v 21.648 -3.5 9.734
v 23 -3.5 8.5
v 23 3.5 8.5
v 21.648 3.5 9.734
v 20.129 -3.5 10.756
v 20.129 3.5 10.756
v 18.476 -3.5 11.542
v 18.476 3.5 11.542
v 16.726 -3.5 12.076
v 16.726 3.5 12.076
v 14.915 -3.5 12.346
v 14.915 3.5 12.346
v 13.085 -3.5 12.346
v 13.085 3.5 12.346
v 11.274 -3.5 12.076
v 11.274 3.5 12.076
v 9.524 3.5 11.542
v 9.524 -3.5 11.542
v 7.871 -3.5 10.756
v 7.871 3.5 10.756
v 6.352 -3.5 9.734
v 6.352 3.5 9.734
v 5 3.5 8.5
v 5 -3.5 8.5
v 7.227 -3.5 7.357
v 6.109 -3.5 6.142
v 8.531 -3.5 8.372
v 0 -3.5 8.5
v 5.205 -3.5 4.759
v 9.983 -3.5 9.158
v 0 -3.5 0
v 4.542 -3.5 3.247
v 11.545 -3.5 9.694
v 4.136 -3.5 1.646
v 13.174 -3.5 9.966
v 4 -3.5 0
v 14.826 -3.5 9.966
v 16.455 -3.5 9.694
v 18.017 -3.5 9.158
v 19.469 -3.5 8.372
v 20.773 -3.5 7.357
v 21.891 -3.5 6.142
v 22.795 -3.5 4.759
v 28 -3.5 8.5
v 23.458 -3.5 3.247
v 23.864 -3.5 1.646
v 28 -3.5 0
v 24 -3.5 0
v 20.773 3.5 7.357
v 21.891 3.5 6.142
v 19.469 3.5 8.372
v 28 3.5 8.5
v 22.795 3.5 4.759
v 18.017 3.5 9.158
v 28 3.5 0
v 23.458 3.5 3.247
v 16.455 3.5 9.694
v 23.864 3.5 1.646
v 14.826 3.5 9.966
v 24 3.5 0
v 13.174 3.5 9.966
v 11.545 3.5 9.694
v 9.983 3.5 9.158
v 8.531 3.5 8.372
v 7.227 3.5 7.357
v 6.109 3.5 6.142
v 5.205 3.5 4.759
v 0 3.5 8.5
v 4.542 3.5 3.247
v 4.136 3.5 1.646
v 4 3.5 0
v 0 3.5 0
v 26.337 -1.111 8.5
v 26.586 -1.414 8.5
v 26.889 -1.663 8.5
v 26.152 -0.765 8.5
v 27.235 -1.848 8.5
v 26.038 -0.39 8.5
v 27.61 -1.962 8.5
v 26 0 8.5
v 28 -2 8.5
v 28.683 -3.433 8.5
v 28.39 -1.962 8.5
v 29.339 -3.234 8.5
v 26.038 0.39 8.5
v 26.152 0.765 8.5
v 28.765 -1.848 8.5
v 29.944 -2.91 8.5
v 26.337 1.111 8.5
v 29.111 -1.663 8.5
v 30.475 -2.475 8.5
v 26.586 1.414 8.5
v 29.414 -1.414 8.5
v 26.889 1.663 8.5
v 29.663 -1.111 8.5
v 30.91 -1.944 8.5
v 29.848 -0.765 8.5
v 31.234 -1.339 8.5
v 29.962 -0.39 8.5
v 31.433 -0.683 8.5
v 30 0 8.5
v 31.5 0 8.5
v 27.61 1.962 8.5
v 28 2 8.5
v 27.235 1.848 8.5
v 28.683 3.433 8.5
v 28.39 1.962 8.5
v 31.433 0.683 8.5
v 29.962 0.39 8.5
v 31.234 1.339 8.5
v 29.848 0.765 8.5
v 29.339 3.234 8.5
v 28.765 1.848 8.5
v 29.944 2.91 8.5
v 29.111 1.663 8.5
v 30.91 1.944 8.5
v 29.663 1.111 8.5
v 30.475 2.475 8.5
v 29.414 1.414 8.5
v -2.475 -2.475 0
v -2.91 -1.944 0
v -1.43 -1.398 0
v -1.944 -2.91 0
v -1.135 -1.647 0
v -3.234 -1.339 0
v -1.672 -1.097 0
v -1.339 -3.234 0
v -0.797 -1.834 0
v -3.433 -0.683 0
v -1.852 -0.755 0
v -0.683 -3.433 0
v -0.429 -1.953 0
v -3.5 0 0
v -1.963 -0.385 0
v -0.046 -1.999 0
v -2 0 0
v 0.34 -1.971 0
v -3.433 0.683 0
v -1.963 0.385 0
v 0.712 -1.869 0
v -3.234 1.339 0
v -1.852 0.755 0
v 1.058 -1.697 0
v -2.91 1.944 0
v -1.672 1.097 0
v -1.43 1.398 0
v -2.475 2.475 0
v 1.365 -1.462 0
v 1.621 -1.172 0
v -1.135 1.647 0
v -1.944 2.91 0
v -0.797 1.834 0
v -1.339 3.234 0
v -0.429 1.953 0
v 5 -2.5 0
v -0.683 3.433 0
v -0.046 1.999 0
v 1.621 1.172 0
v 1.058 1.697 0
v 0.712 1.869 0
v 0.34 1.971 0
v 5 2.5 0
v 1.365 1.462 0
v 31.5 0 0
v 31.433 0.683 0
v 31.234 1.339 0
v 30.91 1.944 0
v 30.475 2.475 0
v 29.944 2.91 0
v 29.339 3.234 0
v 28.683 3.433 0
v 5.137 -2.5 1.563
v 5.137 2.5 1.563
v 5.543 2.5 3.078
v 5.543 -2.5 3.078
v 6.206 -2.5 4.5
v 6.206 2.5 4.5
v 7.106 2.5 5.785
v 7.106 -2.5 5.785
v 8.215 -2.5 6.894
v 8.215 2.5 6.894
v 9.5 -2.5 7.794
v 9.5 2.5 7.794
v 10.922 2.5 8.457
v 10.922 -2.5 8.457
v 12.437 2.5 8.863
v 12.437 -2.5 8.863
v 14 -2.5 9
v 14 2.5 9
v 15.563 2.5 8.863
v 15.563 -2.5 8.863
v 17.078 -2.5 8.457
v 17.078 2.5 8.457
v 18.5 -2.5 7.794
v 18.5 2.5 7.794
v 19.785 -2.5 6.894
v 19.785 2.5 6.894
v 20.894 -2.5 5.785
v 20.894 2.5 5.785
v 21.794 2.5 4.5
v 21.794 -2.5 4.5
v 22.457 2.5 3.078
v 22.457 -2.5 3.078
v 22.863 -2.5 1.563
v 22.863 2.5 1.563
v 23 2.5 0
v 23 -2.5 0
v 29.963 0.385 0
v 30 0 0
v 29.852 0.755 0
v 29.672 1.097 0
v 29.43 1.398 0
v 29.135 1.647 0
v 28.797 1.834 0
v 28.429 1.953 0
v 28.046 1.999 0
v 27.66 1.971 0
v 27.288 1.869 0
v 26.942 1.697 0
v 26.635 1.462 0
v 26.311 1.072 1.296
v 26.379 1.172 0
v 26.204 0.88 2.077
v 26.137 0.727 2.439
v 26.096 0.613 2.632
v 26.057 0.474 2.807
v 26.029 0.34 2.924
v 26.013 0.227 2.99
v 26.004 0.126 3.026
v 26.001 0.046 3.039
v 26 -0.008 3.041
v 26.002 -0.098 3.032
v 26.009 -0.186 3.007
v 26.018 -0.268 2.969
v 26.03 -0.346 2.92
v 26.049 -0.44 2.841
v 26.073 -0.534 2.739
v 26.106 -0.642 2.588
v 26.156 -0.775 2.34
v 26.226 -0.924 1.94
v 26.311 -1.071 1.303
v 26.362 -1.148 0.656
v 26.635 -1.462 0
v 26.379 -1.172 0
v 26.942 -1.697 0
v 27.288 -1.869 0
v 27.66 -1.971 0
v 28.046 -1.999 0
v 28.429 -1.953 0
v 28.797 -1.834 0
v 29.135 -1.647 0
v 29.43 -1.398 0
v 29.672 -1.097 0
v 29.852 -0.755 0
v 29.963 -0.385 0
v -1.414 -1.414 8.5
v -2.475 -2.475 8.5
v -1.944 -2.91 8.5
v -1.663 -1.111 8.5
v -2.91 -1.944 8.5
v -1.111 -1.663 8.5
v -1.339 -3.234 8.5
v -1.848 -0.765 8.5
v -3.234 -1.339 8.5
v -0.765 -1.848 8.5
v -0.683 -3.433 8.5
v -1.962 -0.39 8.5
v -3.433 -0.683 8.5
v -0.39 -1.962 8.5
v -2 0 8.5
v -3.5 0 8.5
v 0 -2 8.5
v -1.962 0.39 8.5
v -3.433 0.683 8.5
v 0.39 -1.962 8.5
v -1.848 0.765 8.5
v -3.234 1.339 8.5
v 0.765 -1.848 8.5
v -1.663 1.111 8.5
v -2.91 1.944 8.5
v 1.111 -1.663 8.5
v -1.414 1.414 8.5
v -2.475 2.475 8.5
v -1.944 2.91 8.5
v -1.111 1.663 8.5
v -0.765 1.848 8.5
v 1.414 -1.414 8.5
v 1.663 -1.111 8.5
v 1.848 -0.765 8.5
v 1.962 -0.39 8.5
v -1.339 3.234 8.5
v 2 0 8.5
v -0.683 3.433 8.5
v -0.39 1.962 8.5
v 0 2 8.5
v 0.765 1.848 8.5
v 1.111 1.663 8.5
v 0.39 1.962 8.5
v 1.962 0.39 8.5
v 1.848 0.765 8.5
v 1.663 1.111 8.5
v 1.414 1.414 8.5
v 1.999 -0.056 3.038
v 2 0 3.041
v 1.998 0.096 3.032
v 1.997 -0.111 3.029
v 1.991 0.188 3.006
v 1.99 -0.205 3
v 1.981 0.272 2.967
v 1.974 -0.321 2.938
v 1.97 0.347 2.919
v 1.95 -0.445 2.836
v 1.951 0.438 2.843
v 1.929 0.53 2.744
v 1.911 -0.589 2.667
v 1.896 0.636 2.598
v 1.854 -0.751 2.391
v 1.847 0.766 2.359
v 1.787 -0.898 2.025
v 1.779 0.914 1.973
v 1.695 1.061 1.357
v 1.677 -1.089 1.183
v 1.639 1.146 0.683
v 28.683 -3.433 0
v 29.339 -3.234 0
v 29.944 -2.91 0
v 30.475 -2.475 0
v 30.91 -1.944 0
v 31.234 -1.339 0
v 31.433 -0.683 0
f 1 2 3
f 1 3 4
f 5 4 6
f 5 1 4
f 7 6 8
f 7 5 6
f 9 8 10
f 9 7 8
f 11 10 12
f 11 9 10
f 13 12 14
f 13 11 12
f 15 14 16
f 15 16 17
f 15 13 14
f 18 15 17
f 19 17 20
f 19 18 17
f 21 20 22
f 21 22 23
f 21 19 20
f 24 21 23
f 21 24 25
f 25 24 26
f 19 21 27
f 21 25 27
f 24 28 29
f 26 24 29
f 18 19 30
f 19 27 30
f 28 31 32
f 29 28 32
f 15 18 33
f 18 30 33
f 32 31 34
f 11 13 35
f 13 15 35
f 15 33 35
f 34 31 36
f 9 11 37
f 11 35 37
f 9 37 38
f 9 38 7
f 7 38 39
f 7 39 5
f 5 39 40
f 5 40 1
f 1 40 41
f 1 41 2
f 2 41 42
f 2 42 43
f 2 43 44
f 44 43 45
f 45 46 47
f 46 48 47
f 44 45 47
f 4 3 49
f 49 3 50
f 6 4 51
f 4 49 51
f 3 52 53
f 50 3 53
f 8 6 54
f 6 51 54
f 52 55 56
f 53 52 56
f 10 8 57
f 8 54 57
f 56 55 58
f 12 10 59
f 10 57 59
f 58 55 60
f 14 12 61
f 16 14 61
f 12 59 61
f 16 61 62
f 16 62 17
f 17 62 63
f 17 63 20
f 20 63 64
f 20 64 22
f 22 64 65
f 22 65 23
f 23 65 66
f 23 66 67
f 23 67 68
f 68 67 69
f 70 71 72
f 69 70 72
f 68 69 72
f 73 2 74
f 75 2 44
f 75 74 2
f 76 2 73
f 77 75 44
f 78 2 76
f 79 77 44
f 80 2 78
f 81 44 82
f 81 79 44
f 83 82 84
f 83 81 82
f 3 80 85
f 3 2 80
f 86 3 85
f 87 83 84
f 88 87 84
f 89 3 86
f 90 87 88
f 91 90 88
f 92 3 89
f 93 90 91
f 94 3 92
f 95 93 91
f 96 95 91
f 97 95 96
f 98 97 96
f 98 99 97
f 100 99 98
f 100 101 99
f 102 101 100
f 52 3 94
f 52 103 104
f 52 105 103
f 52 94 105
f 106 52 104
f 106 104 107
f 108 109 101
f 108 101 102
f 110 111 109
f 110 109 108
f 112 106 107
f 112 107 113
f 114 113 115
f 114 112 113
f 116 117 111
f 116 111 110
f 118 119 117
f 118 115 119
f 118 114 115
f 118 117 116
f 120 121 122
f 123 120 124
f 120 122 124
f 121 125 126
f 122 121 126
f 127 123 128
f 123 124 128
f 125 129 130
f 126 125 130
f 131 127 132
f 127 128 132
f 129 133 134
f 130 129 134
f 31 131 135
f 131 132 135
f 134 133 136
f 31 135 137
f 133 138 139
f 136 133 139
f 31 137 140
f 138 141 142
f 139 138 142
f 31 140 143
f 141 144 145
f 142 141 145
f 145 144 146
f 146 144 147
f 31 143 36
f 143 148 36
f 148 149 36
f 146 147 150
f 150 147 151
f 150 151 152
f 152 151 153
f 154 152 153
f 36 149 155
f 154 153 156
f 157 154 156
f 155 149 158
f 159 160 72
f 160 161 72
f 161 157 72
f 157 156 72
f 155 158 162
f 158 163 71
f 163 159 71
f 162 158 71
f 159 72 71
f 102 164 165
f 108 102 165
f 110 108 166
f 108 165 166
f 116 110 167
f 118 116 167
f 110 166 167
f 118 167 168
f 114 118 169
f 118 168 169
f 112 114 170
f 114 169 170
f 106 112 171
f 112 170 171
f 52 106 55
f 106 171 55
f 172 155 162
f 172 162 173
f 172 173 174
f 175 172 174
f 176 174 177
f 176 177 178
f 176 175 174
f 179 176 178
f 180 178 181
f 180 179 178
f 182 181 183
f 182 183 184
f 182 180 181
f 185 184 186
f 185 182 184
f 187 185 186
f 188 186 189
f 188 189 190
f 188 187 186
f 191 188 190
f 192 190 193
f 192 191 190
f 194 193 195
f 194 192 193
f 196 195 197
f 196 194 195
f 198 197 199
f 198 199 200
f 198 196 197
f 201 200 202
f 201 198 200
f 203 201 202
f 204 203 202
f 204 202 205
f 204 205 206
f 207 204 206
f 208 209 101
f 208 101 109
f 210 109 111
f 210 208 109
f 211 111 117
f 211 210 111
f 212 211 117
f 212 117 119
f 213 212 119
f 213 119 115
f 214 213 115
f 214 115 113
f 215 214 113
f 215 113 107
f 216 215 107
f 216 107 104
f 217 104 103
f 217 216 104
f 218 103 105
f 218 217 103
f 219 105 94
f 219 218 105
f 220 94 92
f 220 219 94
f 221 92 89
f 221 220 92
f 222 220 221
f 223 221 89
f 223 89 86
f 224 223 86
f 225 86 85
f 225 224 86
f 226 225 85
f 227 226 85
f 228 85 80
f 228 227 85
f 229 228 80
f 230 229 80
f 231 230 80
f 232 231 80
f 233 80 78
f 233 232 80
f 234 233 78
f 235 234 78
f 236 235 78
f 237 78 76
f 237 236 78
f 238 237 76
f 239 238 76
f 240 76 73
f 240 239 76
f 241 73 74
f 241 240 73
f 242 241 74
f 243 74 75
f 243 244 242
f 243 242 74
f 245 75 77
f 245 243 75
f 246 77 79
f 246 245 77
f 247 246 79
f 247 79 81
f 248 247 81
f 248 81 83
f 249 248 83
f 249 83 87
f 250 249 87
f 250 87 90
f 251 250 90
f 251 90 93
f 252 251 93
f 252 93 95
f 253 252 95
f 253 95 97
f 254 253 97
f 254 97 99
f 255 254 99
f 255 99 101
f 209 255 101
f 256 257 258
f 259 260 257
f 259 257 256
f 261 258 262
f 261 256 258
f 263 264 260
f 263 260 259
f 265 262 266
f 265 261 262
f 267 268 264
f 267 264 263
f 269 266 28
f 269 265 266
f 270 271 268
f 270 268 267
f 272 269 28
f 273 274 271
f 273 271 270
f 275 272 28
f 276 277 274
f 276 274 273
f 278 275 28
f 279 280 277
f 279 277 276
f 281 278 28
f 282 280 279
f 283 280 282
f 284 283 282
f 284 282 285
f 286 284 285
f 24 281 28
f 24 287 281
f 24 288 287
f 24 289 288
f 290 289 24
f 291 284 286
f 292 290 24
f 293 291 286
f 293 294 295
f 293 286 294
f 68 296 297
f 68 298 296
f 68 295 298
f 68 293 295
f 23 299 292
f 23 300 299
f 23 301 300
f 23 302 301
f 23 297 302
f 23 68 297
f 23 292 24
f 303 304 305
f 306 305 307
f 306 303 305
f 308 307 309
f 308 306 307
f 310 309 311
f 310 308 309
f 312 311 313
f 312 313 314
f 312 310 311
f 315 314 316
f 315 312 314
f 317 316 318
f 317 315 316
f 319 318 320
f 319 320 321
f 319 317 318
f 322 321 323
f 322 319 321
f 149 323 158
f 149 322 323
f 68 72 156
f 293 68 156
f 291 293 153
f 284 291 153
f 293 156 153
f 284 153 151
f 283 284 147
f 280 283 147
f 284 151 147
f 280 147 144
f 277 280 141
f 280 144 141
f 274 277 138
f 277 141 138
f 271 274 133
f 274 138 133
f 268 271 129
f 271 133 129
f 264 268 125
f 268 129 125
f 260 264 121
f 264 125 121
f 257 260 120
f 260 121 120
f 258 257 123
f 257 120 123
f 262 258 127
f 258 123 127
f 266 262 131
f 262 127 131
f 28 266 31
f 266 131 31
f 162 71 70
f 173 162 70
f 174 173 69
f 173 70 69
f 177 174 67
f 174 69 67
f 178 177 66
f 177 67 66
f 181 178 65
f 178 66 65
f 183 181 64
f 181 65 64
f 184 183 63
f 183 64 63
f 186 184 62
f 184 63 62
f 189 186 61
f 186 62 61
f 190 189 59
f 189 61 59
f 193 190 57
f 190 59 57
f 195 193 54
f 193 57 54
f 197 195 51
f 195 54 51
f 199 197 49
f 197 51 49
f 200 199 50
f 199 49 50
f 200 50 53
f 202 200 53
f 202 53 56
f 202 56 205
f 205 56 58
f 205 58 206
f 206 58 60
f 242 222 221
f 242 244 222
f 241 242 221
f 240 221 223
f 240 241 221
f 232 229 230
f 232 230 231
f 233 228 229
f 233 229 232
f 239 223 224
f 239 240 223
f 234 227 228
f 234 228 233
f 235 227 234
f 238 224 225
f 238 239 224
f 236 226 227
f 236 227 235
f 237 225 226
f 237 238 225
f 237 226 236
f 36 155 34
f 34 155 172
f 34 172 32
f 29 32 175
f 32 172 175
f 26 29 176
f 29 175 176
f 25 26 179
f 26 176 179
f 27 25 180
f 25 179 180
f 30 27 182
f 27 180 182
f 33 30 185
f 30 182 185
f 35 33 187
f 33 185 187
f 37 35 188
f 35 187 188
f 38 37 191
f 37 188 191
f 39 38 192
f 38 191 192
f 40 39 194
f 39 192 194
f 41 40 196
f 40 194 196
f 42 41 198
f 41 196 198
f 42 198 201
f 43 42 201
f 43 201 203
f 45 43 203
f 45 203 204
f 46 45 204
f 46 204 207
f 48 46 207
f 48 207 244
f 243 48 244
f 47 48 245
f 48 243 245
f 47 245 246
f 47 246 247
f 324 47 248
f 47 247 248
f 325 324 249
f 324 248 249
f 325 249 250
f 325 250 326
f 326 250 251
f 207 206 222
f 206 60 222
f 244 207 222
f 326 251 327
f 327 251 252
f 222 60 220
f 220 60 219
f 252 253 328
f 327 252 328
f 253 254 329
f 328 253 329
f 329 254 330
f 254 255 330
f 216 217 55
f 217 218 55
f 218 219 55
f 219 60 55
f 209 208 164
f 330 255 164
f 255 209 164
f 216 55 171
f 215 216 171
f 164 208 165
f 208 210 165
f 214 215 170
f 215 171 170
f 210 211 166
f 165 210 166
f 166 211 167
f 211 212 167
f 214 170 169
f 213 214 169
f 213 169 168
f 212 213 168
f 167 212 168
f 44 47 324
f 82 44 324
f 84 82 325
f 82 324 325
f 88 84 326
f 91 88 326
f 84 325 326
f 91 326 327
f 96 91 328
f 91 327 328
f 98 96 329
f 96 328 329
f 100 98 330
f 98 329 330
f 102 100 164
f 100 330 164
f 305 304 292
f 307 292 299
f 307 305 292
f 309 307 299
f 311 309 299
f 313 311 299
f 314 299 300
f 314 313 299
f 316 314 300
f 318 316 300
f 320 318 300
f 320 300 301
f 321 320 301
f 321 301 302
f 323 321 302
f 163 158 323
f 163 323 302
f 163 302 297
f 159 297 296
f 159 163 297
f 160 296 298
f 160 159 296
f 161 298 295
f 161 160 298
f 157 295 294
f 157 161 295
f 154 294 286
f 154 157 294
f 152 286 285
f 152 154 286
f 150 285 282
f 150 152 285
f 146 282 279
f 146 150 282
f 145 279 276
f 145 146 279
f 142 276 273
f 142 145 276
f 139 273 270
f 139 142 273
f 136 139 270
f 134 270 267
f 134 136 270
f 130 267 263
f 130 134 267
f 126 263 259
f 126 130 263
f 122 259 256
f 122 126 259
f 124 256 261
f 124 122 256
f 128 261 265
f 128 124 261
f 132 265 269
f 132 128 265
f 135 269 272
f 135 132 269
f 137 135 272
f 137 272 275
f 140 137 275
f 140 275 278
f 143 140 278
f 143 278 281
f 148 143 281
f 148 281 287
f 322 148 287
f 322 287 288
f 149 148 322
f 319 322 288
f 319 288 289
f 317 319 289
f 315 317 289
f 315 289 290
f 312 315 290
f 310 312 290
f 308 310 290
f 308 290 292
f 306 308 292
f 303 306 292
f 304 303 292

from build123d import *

# Parameters (mm, degrees)
CROQUIS1_R                = 2
SALIENTE_EXTRUIR1_DEPTH   = 8.5
SALIENTE_EXTRUIR1_2_DEPTH = 8.5
SALIENTE_EXTRUIR2_DEPTH   = 7
CHAFL_N1_SIZE             = 1


with BuildPart() as part:
    # Croquis1 → Saliente-Extruir1 (new body)
    with BuildSketch(Plane.XY):
        with BuildLine():
            Line((23, 3.5), (23, -3.5))
            Line((23, -3.5), (28, -3.5))
            ThreePointArc((28, -3.5), (30.474873734, -2.474873734), (31.5, 0))
            ThreePointArc((31.5, 0), (30.474873734, 2.474873734), (28, 3.5))
            Line((28, 3.5), (23, 3.5))
        make_face()
        with Locations((28, 0)):
            Circle(CROQUIS1_R, mode=Mode.SUBTRACT)
    extrude(amount=SALIENTE_EXTRUIR1_DEPTH)



with BuildPart() as body_2:
    # Croquis1 → Saliente-Extruir1 2 (new body)
    with BuildSketch(Plane.XY):
        with BuildLine():
            Line((5, -3.5), (5, 3.5))
            Line((5, 3.5), (0, 3.5))
            ThreePointArc((0, 3.5), (-3.5, 0), (0, -3.5))
            Line((0, -3.5), (5, -3.5))
        make_face()
        Circle(CROQUIS1_R, mode=Mode.SUBTRACT)
    extrude(amount=SALIENTE_EXTRUIR1_2_DEPTH)


with BuildPart() as part_1:
    add(part.part)

    add(body_2.part)  # Saliente-Extruir2 merges body 2
    # Croquis2 → Saliente-Extruir2 (add, through all)
    with BuildSketch(Plane.XZ.offset(3.5)):
        with BuildLine():
            Line((1.620581602, 2e-09), (5.000000002, 2e-09))
            ThreePointArc((5.000000002, 2e-09), (14.000000002, 9.000000002), (23.000000002, 2e-09))
            Line((23.000000002, 2e-09), (26.379418402, 2e-09))
            ThreePointArc((26.379418402, 2e-09), (14.000000002, 12.379418402), (1.620581602, 2e-09))
        make_face()
    extrude(amount=-SALIENTE_EXTRUIR2_DEPTH)

    # Chaflán1
    chafl_n1_edges = [part_1.edges().sort_by_distance(p)[0] for p in [
        (14.000000002, 3.5, 9.000000002),
        (14.000000002, -3.5, 9.000000002),
    ]]
    chamfer(chafl_n1_edges, length=CHAFL_N1_SIZE)


solid = part_1.part
